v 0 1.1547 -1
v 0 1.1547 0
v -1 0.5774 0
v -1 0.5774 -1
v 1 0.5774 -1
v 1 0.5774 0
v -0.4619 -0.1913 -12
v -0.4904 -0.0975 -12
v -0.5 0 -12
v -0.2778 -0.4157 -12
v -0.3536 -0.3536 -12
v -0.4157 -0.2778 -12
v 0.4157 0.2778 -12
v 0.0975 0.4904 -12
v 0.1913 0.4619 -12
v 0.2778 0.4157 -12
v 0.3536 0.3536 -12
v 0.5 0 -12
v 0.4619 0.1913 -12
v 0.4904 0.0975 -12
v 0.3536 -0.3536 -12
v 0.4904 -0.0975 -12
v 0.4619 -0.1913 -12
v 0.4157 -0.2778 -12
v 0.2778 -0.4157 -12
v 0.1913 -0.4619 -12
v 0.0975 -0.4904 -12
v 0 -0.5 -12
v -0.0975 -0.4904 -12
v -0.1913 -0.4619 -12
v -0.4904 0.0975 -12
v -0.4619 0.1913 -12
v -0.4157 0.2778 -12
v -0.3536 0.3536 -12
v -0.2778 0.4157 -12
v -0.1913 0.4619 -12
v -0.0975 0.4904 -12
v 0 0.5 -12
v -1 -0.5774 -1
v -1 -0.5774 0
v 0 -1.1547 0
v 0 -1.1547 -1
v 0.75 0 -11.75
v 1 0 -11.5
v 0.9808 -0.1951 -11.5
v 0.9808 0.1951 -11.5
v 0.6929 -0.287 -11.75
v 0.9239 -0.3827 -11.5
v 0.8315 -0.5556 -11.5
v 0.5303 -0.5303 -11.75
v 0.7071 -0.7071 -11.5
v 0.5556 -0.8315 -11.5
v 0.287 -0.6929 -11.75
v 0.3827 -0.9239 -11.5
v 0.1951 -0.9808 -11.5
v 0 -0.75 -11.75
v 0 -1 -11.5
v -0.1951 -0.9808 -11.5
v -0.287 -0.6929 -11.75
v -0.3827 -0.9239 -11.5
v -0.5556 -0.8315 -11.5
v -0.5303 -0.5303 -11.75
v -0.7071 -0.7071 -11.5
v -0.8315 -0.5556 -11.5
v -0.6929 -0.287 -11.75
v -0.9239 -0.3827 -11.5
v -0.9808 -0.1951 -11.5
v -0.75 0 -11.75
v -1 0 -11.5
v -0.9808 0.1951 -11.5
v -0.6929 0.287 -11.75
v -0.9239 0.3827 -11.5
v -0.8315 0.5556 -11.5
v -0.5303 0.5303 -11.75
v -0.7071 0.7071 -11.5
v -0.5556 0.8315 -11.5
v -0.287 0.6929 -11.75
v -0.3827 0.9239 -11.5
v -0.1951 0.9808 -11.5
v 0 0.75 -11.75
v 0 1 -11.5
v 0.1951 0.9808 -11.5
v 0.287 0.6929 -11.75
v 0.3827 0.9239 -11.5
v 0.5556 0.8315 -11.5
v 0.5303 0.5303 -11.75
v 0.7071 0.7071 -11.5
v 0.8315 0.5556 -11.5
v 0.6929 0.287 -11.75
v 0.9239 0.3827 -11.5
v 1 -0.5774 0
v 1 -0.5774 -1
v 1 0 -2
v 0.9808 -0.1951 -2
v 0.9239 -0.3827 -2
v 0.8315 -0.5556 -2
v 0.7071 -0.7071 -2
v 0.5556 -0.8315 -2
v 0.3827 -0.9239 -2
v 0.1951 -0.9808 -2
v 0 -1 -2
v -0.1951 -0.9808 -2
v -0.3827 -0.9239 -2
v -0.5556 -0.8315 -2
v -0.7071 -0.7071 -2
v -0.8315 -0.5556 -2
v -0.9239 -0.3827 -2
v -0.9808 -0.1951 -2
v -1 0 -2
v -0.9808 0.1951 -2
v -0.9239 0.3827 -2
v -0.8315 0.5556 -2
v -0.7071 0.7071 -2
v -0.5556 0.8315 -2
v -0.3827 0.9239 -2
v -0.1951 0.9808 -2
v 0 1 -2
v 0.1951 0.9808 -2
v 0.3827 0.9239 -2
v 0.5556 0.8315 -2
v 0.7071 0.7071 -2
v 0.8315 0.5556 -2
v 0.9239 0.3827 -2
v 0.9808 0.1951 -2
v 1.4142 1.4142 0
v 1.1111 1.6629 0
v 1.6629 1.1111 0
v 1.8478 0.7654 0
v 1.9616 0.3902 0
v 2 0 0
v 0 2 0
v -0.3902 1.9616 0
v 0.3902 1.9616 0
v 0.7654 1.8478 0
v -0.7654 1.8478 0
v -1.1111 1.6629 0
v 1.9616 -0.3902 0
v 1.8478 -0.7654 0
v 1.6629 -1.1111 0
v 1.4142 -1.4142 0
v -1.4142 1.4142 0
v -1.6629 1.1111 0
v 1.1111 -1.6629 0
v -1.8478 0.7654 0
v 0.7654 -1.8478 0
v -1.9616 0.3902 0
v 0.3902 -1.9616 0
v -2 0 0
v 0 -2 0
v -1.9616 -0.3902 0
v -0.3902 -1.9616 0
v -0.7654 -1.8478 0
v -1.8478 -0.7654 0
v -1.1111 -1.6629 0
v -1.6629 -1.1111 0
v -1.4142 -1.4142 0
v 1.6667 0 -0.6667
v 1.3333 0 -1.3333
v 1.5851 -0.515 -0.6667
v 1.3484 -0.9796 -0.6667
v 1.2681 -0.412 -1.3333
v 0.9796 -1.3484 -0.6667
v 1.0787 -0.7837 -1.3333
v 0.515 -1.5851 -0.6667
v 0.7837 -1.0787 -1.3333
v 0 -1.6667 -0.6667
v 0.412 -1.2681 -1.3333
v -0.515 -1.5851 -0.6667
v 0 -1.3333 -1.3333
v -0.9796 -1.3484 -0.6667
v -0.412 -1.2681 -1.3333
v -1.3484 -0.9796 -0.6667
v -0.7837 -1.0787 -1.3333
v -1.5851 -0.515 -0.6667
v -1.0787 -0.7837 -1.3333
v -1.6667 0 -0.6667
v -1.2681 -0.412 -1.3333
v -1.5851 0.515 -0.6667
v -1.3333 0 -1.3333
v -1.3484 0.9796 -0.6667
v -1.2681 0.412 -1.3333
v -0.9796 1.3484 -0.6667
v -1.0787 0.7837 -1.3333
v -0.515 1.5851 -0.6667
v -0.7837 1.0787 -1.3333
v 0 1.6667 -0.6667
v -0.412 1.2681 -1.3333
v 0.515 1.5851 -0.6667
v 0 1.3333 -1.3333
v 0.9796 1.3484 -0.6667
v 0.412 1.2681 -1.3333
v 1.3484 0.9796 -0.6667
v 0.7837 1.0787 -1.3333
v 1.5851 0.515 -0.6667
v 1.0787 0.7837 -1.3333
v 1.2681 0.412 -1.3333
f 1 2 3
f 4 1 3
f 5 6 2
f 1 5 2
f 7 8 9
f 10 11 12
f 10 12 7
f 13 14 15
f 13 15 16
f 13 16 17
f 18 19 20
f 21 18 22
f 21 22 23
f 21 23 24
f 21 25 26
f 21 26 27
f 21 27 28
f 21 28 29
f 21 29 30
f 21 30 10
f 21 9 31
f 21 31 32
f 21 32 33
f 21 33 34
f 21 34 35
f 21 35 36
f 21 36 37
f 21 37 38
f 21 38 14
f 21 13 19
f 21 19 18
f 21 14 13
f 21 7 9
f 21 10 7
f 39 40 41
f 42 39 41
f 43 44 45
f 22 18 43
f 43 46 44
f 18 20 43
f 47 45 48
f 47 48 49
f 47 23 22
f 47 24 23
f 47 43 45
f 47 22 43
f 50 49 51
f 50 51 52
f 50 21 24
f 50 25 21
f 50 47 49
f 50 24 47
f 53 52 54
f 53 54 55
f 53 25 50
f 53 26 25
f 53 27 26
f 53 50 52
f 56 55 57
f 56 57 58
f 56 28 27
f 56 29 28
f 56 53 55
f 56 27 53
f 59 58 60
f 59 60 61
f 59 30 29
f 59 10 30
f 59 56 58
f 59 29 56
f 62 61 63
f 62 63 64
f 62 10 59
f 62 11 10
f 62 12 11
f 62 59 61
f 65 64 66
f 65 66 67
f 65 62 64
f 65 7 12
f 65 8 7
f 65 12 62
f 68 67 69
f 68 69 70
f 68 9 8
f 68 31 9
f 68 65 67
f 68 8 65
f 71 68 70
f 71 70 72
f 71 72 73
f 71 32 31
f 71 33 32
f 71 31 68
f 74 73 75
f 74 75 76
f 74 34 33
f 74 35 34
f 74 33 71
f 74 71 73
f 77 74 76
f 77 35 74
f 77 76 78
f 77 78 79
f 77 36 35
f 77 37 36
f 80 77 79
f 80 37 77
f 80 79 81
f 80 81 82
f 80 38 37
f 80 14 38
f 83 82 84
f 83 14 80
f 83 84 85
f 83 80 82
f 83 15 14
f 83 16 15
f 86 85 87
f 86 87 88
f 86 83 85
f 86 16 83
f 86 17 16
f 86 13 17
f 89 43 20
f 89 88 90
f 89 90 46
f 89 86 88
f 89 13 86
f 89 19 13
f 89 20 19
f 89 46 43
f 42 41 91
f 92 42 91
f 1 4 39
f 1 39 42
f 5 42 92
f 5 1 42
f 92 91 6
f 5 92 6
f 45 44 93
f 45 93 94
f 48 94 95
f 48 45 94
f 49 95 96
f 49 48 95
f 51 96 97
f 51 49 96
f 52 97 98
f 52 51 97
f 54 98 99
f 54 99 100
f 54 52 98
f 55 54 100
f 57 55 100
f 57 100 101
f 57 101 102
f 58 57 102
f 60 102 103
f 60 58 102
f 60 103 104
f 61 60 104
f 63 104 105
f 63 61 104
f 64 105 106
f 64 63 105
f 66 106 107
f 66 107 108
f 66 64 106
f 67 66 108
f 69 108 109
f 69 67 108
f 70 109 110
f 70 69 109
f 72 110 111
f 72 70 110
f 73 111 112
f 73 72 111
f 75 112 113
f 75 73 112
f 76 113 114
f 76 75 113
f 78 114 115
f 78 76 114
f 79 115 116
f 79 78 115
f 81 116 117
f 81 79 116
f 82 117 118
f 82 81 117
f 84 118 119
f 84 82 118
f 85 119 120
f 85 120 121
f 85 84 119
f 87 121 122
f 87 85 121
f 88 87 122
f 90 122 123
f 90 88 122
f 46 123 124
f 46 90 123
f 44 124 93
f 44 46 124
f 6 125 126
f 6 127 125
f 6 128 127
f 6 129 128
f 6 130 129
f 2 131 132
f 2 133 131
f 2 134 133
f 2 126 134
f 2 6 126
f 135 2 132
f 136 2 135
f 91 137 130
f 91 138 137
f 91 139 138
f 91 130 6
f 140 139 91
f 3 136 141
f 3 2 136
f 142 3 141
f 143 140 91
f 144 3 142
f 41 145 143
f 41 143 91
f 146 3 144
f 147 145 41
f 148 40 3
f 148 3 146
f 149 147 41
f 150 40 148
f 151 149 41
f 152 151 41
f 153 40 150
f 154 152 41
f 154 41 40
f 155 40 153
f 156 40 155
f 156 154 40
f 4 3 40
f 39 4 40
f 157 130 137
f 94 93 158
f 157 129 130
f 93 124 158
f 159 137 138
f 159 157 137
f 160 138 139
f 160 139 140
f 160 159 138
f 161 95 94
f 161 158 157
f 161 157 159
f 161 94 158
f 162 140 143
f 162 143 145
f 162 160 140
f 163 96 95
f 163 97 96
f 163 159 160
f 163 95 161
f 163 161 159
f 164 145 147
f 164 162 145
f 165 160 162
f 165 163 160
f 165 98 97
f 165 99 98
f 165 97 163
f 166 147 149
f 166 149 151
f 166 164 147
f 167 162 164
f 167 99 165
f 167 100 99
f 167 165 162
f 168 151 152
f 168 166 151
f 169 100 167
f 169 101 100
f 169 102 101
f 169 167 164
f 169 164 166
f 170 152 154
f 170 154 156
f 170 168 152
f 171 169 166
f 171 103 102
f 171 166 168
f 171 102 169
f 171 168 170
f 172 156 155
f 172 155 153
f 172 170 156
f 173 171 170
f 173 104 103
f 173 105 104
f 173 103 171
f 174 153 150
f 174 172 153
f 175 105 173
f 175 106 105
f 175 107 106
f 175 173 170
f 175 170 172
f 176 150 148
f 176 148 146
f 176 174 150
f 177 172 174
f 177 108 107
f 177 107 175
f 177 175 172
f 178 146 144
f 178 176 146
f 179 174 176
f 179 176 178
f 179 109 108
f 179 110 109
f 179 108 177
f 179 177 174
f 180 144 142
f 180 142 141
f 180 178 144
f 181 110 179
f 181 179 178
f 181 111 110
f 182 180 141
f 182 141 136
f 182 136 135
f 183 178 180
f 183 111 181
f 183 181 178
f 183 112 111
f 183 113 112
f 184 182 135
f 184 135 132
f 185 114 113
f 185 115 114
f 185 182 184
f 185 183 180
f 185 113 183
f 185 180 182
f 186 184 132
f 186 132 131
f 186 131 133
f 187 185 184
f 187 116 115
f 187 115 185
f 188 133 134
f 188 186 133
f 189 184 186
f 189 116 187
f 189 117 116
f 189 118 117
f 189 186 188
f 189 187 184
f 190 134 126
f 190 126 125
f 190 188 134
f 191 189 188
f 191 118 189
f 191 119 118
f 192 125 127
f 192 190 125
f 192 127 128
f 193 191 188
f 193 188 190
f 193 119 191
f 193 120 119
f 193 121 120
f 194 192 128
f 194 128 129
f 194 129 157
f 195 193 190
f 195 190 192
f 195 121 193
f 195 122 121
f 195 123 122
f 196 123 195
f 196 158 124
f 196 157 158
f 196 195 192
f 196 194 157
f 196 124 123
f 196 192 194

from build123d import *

# Parameters (mm, degrees)
FOOTPRINT_DEPTH = 1
CHAMFER1_SIZE   = 0.5


with BuildPart() as part:
    # Sketch1 → Body (revolve)
    with BuildSketch(Plane(origin=(0, 0, 0), x_dir=(0, 0, -1), z_dir=(1, 0, 0)), mode=Mode.PRIVATE) as body_sk:
        Polygon((0, 0), (0, 2), (2, 1), (12, 1), (12, 0), align=None)
    revolve(body_sk.sketch.rotate(Axis((0, 0, 58.51474448), (0, 0, -1)), 90), axis=Axis((0, 0, 58.51474448), (0, 0, -1)))

    # Sketch2 → Footprint (cut)
    with BuildSketch(Plane.XY):
        Polygon((0, 1.154700538), (-1, 0.577350269), (-1, -0.577350269), (0, -1.154700538), (1, -0.577350269), (1, 0.577350269), align=None)
    extrude(amount=-FOOTPRINT_DEPTH, mode=Mode.SUBTRACT)

    # Chamfer1
    chamfer1_edges = [part.edges().sort_by_distance(p)[0] for p in [
        (-1, 0, -12),
    ]]
    chamfer(chamfer1_edges, length=CHAMFER1_SIZE)


solid = part.part
